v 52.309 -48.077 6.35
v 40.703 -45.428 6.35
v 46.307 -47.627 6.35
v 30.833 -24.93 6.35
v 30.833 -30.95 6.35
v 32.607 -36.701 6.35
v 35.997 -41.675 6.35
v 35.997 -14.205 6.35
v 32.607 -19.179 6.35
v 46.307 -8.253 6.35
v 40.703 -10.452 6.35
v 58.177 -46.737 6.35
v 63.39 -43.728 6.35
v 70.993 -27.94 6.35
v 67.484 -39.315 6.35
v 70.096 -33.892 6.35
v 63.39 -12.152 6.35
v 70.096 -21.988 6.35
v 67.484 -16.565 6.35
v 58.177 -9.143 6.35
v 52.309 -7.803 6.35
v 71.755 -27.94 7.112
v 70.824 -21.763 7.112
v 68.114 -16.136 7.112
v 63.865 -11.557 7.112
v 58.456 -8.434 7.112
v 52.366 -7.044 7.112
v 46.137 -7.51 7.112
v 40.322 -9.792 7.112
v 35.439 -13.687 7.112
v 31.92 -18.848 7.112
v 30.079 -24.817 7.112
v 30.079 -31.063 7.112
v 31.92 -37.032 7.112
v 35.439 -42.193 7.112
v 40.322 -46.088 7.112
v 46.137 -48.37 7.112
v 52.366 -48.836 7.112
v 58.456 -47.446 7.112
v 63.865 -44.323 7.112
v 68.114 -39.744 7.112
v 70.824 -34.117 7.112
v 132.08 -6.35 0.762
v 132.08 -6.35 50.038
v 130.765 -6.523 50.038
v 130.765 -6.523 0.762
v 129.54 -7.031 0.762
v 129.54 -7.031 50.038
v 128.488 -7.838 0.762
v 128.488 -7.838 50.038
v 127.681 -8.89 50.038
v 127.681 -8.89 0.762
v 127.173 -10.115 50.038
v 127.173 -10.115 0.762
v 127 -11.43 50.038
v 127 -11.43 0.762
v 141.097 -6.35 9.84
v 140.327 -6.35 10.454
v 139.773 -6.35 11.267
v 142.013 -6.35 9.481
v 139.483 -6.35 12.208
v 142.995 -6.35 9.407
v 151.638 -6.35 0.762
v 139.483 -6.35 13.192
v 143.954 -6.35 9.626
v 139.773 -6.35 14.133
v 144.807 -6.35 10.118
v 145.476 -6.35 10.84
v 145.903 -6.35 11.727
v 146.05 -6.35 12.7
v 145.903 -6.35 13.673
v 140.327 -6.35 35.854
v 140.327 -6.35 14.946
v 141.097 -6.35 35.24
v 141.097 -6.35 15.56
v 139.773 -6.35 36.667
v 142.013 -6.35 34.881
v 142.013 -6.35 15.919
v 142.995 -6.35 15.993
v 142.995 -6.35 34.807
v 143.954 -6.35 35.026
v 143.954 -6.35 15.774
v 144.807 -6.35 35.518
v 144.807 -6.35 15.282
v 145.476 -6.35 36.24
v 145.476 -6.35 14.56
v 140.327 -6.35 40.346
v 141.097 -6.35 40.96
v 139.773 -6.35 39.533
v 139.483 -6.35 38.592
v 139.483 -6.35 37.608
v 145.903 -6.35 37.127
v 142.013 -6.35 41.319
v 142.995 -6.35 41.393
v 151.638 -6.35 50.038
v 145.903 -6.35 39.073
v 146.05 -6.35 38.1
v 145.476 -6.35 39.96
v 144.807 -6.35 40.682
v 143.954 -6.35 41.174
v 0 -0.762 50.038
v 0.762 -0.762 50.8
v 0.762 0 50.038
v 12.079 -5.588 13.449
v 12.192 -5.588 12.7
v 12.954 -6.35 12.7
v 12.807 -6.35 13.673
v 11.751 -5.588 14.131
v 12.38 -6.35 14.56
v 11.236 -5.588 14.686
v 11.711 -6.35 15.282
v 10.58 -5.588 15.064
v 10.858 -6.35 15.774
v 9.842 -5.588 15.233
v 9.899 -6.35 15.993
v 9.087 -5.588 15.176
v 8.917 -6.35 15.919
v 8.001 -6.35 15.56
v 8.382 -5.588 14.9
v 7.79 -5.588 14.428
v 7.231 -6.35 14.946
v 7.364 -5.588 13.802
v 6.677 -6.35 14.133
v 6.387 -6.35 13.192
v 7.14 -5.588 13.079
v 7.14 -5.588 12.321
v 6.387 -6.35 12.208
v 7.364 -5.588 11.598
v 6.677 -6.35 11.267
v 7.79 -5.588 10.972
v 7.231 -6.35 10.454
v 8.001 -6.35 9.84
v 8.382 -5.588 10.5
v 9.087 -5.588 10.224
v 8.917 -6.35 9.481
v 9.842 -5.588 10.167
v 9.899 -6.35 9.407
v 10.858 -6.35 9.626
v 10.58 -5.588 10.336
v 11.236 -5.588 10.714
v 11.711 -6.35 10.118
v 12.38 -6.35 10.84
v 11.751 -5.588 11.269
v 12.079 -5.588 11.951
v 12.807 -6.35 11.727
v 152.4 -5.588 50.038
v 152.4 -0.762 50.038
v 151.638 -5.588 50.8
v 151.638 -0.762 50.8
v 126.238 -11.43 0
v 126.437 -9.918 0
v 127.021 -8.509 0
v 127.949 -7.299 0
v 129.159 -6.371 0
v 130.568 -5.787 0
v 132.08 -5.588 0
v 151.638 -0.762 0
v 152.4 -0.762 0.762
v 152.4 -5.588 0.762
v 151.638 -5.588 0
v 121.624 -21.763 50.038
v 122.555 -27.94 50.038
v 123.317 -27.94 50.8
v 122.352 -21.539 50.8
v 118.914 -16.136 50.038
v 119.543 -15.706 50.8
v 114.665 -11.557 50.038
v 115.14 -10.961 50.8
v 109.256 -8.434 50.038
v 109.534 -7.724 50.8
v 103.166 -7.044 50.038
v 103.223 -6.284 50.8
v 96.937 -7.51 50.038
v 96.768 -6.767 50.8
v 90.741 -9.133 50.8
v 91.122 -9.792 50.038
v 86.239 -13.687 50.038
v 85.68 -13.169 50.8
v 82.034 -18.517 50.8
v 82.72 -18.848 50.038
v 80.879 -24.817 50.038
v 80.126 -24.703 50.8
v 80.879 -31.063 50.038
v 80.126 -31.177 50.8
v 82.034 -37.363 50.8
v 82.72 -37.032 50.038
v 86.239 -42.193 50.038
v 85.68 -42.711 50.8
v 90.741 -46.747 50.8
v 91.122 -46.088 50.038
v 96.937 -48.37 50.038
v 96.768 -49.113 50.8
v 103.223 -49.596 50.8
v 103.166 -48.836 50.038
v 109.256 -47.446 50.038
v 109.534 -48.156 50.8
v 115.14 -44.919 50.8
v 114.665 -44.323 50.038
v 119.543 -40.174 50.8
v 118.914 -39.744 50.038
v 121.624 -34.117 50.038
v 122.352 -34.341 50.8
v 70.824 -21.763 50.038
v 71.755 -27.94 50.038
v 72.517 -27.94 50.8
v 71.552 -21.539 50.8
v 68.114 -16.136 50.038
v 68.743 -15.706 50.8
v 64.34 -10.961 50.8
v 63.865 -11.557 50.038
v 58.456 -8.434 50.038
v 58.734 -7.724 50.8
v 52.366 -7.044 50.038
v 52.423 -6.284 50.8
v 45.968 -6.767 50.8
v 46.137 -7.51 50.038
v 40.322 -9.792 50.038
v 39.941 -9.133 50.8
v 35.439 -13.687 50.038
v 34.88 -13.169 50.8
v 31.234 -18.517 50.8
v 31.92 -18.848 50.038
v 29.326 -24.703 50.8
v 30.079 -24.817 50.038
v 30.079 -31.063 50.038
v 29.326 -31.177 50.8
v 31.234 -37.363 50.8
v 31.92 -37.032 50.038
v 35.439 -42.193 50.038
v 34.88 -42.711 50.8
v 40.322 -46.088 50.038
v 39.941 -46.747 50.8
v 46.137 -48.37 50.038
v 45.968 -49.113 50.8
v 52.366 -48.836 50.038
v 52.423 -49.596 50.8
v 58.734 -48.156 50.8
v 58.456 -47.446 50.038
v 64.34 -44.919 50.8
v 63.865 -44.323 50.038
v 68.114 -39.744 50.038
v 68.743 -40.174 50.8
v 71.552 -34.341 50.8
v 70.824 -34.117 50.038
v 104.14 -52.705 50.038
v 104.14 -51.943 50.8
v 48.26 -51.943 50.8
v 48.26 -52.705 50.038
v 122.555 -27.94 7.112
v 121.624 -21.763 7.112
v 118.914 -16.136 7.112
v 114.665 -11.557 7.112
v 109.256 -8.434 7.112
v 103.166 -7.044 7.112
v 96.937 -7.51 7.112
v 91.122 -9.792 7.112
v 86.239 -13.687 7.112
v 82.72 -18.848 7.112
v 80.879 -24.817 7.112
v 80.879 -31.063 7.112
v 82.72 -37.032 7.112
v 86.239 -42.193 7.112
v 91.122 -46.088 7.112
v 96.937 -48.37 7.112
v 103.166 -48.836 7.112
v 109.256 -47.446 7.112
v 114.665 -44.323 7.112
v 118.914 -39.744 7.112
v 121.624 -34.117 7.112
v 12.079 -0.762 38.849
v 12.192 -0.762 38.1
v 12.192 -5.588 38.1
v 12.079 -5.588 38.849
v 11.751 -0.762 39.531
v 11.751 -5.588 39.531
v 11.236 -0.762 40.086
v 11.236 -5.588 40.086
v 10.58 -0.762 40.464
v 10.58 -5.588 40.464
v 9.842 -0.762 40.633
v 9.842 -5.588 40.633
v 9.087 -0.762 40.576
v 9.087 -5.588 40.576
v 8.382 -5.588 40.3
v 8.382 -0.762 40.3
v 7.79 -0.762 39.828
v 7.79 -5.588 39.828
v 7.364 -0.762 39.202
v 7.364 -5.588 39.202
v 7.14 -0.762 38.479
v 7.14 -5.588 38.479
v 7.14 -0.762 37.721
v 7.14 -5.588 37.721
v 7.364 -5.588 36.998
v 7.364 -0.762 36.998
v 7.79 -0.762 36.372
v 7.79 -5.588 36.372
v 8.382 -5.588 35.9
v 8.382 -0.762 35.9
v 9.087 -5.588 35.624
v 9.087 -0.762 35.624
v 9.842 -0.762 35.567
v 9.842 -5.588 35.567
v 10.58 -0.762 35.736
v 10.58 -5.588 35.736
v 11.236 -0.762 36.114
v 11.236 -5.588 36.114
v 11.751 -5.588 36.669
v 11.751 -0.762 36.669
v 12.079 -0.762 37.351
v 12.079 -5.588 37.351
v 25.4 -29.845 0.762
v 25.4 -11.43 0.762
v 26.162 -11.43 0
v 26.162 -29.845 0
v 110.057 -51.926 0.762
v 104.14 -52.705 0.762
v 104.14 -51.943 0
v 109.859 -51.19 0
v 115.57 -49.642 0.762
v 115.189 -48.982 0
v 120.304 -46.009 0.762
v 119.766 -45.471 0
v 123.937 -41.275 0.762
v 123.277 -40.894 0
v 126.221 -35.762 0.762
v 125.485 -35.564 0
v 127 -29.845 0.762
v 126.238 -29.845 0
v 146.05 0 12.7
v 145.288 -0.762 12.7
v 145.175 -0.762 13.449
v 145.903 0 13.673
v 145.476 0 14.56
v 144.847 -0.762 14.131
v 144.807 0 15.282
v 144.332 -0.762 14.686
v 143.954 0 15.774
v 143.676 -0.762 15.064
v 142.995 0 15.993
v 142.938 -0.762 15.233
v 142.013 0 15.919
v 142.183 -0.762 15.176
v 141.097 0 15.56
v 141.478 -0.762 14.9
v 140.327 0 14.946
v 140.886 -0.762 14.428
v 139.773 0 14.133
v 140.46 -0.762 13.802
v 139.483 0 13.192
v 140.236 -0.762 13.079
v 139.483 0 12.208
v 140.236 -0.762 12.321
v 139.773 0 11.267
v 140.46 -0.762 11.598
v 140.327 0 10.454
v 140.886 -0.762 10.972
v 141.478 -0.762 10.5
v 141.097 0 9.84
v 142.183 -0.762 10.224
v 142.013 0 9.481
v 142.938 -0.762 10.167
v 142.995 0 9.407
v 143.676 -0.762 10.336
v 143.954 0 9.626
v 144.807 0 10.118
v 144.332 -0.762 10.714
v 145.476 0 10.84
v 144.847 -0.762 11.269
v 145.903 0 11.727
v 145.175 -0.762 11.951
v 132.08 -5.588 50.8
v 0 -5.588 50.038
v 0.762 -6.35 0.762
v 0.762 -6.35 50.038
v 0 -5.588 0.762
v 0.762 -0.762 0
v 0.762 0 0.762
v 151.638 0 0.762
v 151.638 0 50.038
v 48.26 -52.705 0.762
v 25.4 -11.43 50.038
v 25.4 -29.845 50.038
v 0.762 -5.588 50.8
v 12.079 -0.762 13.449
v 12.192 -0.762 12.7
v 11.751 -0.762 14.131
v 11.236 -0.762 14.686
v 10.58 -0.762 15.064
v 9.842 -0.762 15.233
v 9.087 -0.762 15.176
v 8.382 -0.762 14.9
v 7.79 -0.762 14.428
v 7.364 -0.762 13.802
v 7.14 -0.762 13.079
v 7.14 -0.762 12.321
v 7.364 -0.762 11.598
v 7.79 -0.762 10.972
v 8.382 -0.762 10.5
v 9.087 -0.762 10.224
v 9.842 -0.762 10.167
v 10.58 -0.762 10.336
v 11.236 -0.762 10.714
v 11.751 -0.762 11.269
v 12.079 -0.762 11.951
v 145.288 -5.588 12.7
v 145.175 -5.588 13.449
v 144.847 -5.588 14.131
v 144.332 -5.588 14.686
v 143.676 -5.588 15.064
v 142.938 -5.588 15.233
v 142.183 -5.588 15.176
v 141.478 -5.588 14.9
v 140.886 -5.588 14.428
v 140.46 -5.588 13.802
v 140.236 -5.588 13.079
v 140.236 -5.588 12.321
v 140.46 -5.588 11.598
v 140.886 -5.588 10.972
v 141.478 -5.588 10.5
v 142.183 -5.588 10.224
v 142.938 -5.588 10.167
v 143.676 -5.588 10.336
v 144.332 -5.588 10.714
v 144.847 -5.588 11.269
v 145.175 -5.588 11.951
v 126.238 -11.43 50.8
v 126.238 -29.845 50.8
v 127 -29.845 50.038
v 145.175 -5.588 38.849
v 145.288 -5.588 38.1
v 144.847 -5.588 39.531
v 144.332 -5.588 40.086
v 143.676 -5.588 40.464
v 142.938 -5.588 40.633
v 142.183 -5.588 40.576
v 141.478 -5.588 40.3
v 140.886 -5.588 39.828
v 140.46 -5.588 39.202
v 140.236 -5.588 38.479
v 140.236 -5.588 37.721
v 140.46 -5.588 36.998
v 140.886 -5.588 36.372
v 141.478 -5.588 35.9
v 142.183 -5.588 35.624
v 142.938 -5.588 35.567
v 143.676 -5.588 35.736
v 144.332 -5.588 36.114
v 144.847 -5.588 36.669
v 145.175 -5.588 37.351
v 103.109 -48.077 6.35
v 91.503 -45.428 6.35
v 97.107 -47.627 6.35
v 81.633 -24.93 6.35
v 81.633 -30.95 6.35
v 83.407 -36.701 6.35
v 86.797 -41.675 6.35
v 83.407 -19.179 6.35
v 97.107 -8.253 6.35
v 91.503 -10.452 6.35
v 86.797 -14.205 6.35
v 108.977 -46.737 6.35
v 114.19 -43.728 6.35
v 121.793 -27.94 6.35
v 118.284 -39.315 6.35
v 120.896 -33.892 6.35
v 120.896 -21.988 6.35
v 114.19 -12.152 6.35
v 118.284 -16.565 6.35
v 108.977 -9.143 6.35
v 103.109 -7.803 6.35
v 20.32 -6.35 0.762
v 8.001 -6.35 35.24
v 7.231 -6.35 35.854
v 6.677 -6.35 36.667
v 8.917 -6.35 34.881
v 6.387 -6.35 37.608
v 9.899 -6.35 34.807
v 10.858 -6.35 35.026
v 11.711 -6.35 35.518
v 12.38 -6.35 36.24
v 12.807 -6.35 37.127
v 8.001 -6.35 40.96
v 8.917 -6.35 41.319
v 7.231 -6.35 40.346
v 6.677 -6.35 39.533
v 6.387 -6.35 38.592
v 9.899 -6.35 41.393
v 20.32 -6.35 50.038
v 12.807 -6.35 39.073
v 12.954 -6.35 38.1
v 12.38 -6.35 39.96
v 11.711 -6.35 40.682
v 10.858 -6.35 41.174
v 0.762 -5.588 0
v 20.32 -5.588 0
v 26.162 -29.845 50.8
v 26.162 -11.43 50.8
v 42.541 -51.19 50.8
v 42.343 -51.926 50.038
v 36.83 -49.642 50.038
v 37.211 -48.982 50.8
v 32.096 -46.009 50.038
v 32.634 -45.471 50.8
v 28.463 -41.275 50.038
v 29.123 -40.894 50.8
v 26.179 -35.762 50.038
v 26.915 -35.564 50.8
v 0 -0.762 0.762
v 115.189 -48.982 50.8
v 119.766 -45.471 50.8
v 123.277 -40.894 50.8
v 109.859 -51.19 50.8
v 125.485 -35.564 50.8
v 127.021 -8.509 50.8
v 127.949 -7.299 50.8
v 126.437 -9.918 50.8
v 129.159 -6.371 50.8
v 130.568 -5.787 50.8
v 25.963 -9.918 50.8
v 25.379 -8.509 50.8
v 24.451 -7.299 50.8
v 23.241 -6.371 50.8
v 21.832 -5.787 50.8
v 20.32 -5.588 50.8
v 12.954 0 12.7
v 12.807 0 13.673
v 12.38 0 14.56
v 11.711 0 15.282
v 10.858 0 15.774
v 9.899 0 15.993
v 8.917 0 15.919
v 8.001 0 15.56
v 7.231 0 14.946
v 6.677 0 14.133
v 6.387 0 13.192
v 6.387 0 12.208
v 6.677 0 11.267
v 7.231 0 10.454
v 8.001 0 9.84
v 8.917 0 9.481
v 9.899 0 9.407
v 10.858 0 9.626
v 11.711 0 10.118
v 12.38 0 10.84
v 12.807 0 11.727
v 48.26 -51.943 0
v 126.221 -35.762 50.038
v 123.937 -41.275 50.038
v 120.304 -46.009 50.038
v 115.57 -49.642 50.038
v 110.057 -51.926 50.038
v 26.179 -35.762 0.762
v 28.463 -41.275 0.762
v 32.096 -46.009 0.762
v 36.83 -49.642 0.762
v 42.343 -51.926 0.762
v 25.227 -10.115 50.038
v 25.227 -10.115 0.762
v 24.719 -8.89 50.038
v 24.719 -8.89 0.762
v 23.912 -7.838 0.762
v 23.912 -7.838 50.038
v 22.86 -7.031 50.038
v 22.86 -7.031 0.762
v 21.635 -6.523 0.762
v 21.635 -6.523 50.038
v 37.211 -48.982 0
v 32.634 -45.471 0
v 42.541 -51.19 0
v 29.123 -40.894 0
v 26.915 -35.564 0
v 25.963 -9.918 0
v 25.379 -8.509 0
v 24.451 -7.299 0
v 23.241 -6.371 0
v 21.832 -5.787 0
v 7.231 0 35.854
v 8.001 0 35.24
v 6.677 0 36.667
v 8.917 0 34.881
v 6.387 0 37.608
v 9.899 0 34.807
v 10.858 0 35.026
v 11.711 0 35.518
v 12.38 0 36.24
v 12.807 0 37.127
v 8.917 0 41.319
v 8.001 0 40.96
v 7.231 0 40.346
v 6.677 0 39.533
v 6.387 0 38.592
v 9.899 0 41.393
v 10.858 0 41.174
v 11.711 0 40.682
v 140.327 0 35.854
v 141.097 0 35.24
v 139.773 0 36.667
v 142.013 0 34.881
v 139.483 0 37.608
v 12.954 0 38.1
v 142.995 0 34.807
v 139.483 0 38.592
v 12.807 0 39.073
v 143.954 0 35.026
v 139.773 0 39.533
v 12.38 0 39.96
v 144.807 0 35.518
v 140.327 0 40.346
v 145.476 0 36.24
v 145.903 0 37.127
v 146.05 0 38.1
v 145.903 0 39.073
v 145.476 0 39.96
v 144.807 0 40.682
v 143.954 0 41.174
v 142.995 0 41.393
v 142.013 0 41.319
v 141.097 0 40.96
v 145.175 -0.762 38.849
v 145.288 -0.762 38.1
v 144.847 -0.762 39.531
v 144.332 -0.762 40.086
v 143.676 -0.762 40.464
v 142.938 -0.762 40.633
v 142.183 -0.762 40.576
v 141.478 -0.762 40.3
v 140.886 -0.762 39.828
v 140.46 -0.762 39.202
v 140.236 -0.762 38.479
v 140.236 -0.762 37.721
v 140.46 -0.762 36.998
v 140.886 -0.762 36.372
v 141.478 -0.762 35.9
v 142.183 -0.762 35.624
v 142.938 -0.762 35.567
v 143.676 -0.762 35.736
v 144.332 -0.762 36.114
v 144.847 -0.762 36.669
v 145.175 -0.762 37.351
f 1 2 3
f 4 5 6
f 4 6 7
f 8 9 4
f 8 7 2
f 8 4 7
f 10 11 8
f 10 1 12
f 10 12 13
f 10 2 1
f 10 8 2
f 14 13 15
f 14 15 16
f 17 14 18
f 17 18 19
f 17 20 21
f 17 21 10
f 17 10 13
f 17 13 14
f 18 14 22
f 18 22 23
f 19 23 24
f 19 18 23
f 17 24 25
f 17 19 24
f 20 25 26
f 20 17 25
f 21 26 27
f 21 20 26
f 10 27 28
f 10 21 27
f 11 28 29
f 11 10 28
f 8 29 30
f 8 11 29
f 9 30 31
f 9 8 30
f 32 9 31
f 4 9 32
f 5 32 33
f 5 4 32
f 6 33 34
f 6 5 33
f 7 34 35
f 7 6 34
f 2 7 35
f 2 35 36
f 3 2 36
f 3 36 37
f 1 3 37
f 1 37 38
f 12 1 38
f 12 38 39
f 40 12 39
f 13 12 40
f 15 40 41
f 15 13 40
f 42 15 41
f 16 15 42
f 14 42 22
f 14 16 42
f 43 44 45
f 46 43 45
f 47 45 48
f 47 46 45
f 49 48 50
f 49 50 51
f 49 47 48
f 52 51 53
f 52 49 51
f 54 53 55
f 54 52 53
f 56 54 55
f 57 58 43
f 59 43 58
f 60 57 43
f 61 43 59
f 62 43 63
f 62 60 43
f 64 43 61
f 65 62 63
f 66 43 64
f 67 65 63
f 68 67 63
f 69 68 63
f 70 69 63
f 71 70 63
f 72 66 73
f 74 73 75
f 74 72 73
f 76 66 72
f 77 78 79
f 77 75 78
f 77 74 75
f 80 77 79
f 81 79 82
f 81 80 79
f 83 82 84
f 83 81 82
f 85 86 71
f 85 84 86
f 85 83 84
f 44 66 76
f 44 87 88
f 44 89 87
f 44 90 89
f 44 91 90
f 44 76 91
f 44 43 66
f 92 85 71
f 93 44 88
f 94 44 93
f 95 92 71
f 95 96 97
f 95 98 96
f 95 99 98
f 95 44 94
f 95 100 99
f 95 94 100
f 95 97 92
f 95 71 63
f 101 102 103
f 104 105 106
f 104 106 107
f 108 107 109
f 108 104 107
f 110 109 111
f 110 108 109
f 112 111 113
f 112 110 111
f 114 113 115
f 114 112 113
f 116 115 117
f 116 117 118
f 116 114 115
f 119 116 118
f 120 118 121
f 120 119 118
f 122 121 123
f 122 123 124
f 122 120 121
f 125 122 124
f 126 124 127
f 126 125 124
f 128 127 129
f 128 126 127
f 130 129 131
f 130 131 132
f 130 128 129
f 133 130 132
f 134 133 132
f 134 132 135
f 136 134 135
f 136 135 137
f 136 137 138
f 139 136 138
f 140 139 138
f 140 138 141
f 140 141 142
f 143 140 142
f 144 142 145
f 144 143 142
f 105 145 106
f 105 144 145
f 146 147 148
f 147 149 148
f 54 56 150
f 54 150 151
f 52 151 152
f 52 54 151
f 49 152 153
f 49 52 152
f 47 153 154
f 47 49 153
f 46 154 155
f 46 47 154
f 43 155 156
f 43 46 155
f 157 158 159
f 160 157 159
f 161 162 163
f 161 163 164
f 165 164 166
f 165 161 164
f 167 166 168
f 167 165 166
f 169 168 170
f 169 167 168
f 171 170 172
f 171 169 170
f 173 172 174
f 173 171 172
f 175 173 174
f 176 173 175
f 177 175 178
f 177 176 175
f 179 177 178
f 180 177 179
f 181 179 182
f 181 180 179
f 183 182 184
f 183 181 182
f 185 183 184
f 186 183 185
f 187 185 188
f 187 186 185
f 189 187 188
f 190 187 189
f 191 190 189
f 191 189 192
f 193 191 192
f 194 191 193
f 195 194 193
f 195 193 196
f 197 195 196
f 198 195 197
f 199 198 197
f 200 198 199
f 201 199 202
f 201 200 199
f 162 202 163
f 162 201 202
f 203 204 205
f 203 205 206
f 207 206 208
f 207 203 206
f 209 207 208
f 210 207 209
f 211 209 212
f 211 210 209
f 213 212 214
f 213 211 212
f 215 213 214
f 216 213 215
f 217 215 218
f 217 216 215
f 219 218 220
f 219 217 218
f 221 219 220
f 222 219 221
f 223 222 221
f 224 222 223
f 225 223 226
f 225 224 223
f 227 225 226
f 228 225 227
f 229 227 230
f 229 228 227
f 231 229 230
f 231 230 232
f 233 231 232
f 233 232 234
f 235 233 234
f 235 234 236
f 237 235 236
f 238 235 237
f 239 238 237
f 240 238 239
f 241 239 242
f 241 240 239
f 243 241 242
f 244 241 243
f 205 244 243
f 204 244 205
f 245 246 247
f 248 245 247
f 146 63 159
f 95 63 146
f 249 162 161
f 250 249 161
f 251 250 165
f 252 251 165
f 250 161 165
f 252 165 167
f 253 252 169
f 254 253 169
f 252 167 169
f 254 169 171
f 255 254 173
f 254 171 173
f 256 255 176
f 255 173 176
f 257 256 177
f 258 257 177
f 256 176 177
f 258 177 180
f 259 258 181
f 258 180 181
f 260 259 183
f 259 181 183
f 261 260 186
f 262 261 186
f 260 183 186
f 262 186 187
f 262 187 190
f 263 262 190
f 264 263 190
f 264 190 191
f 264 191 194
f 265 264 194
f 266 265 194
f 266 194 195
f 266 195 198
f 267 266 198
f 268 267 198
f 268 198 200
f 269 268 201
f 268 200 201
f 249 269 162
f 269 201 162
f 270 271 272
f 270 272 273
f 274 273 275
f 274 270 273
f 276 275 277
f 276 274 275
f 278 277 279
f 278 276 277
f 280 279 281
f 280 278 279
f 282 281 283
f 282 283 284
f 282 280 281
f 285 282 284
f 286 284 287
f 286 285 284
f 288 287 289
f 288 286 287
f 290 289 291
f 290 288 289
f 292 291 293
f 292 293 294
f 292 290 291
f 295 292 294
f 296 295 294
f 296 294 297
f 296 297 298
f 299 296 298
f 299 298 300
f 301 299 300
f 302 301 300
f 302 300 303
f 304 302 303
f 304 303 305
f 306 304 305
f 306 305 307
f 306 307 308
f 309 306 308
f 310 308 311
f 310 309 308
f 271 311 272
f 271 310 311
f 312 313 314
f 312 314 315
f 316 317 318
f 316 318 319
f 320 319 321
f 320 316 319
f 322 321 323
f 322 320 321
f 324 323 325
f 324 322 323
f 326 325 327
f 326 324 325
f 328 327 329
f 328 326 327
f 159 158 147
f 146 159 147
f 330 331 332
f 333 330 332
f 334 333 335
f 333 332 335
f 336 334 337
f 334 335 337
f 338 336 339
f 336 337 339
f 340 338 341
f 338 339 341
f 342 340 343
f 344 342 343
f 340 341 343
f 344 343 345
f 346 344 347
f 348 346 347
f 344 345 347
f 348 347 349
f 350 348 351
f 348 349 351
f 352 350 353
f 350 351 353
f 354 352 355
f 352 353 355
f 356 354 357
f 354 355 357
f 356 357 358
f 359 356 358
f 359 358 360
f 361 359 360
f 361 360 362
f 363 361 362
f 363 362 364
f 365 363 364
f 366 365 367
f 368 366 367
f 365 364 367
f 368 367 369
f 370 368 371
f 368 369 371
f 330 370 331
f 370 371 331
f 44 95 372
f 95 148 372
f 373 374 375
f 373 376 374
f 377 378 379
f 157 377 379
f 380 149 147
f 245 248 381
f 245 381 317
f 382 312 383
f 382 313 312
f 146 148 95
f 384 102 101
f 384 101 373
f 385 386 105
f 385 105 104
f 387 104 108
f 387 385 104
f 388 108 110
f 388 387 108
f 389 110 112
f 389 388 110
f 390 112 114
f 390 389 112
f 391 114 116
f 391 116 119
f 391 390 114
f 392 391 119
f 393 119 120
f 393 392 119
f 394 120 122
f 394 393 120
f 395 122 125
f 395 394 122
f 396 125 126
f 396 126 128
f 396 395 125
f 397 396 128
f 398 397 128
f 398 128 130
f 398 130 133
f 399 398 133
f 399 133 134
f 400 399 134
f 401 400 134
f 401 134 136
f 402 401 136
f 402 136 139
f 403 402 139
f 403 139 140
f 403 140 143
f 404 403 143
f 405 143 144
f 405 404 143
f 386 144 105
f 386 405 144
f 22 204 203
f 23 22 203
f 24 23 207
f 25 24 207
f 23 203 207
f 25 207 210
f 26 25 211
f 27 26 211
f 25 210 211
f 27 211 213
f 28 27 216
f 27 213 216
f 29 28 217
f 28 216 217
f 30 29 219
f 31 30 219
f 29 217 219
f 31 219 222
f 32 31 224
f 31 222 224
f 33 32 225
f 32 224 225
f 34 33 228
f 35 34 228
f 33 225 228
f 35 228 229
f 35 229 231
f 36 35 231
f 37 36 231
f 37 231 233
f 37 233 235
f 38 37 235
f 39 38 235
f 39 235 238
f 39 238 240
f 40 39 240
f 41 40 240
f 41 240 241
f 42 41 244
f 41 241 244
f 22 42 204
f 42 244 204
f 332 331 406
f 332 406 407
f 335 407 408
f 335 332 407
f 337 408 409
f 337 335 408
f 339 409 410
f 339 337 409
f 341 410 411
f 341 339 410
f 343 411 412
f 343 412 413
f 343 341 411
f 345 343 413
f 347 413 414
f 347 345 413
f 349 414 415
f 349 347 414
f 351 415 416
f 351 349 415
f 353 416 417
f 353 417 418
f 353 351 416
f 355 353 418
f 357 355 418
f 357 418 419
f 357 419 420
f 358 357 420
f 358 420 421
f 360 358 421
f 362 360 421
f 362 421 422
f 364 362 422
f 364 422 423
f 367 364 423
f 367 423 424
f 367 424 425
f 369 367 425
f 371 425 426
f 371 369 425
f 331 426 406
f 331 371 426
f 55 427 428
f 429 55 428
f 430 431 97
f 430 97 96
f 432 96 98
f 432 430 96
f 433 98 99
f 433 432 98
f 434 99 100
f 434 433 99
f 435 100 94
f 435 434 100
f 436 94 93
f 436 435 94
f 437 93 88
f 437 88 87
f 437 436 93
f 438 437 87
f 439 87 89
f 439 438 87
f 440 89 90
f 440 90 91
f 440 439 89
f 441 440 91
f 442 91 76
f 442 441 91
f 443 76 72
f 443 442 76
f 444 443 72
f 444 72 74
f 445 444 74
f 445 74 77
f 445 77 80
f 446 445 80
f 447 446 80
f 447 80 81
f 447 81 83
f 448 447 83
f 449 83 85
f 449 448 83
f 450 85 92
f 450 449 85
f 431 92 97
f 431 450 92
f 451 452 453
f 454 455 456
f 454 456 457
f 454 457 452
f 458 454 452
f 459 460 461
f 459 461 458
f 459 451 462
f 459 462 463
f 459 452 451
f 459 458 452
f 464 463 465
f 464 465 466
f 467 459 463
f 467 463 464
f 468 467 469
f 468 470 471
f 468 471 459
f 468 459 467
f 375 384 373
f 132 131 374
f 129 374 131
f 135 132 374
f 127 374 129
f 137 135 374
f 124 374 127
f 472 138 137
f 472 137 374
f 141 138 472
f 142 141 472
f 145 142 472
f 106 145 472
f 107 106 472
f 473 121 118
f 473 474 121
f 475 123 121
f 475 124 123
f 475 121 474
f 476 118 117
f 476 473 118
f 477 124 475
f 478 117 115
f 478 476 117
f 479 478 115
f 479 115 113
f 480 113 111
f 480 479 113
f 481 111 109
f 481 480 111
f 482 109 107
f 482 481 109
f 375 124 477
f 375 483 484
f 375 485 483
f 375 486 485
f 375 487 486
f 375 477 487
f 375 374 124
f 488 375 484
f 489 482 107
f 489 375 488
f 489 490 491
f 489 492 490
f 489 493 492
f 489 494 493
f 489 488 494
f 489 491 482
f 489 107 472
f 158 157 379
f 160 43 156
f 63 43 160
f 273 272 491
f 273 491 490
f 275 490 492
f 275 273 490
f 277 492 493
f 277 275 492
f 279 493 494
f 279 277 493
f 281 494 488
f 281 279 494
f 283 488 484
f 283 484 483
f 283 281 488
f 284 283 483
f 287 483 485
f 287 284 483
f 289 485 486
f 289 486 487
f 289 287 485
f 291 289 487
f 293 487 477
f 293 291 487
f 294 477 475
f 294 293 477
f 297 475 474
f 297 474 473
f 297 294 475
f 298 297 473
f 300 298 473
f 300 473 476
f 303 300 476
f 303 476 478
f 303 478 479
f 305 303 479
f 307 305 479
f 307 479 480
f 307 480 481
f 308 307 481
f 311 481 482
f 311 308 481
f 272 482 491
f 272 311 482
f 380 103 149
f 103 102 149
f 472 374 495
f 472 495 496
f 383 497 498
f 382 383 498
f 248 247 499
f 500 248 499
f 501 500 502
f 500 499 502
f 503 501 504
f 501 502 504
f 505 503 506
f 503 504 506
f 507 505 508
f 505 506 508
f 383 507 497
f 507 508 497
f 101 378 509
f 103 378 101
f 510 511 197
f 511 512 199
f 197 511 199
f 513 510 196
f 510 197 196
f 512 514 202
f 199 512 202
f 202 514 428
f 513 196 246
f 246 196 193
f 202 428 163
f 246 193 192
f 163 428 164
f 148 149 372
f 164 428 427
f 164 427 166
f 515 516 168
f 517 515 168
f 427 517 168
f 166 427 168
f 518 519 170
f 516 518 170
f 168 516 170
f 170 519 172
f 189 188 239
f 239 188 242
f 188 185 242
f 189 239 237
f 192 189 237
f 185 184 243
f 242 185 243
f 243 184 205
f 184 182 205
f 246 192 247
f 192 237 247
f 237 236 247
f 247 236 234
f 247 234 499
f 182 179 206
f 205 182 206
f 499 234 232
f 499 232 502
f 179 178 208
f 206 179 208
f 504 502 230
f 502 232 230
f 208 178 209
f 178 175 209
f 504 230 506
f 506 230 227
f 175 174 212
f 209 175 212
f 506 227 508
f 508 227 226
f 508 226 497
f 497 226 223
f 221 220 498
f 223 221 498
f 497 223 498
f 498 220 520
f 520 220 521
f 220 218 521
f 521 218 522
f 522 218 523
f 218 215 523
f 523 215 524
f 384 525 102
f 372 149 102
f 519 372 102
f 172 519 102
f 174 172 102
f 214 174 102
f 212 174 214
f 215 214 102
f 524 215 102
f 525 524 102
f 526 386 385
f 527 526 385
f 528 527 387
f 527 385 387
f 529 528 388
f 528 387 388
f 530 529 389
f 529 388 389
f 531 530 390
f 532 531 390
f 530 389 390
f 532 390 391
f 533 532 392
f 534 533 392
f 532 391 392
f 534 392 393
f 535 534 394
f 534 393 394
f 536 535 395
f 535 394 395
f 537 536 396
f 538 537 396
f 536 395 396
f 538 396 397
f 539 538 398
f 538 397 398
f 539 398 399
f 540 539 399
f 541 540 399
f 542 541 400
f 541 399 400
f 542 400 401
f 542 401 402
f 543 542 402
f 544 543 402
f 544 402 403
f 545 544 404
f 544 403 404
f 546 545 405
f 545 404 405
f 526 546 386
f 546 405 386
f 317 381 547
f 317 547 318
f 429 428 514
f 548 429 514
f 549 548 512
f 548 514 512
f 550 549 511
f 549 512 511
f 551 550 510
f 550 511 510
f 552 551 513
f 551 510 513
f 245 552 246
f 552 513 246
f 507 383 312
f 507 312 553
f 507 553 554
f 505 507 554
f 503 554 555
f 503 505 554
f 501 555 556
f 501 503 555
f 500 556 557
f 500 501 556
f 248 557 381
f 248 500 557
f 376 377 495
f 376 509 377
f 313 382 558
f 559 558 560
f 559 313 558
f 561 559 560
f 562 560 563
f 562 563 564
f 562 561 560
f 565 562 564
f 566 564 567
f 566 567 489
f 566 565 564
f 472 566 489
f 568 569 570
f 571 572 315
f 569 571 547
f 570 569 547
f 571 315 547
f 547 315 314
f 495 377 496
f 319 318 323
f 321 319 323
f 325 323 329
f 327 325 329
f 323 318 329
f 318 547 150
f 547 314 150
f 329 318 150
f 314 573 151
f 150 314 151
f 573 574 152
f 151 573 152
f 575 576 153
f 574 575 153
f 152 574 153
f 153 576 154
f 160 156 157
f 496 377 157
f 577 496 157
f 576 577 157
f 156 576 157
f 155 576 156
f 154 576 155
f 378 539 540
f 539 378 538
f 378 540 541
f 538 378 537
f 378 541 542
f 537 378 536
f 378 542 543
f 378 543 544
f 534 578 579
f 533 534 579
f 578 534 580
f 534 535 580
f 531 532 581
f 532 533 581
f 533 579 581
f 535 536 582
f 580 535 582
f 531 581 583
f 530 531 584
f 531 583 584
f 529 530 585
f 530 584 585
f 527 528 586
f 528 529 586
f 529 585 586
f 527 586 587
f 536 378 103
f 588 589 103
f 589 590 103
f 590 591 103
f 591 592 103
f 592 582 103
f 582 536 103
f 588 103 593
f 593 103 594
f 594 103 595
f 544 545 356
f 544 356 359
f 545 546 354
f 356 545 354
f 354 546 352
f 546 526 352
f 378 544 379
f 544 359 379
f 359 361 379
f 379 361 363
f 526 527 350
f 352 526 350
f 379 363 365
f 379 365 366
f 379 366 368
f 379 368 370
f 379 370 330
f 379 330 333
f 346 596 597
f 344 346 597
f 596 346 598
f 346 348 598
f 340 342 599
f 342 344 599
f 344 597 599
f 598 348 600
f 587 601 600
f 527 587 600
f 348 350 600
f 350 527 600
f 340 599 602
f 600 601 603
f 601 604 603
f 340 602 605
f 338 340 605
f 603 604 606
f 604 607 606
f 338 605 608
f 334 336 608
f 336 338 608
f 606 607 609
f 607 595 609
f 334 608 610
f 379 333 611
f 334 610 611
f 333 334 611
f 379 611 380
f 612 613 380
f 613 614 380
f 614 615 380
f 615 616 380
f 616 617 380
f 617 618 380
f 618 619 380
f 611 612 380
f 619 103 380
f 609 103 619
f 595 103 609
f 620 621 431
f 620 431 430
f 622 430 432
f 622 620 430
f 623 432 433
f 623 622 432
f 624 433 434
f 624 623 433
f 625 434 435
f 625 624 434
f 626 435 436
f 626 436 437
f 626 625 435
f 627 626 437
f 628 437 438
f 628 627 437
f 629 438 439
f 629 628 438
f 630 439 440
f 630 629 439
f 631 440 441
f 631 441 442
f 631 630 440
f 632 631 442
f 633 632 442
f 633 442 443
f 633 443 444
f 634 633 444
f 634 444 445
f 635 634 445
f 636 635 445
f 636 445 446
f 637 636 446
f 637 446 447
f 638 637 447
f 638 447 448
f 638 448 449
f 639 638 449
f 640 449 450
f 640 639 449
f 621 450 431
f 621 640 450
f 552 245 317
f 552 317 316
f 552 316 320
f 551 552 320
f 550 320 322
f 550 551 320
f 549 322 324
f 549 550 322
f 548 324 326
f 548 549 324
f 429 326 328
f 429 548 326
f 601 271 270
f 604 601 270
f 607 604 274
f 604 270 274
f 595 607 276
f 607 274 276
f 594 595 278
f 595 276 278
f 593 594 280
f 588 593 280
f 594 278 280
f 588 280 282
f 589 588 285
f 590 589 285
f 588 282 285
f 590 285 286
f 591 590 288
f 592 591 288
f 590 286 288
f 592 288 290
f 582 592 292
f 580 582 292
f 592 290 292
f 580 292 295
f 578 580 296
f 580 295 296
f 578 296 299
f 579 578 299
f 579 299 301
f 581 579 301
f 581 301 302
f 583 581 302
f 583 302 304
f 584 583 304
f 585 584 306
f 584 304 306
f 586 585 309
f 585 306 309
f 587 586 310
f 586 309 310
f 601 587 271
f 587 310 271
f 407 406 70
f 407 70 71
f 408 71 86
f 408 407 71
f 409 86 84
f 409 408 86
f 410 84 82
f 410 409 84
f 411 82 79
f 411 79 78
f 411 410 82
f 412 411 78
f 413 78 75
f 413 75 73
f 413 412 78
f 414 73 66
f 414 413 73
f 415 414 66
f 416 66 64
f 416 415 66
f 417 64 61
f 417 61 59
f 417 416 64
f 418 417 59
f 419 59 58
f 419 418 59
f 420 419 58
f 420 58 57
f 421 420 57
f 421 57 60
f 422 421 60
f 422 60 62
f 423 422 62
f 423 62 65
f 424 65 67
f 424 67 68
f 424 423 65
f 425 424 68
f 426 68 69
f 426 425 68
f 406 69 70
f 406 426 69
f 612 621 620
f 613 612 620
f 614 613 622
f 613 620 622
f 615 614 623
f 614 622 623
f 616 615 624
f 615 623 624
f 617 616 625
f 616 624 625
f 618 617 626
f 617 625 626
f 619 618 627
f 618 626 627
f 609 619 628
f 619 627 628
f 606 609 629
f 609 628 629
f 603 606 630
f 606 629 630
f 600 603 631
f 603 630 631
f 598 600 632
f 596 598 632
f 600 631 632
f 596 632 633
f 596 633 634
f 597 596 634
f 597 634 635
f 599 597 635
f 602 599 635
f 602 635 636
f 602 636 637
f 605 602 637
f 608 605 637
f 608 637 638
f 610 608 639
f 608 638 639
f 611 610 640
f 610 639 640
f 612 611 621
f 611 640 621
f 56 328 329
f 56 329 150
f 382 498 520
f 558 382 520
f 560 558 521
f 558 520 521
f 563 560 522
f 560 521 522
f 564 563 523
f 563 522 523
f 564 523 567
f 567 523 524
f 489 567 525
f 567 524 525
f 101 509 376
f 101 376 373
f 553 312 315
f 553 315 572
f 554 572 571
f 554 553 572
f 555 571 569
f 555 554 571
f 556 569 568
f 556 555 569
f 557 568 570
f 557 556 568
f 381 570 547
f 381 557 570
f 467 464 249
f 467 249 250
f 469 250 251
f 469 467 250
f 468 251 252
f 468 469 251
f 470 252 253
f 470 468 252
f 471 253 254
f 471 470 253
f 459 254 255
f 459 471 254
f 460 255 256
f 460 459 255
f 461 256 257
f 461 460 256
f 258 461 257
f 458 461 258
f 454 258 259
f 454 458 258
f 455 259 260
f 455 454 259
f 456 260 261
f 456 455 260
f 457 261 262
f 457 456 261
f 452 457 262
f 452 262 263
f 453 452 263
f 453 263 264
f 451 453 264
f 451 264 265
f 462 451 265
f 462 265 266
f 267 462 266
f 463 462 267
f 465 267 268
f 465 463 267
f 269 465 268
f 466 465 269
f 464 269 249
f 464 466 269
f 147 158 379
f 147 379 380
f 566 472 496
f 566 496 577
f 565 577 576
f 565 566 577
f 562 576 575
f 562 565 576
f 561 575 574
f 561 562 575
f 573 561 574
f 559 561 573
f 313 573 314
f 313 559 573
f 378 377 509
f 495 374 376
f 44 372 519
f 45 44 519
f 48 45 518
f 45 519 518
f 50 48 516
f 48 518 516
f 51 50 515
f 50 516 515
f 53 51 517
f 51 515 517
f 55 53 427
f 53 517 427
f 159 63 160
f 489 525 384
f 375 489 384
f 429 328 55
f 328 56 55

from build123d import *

# Parameters (mm, degrees)
F0_W     = 25.4
F0_H     = 50.8
F0_R     = 2.54
F0_W_2   = 50.8
F1_DEPTH = 6.35
F2_DEPTH = 52.705
F3_R     = 5.08
F4_R     = 20.955
F5_DEPTH = 44.45
F6_R     = 22.86
F7_SIZE  = 0.762


with BuildPart() as f1:
    # F0 (on Front) → F1 (new body)
    with BuildSketch(Plane.XZ):
        with Locations((12.7, 25.4)):
            Rectangle(F0_W, F0_H)
        with Locations((9.652, 12.7)):
            Circle(F0_R, mode=Mode.SUBTRACT)
        with Locations((9.652, 38.1)):
            Circle(F0_R, mode=Mode.SUBTRACT)
        with Locations((139.7, 25.4)):
            Rectangle(F0_W, F0_H)
        with Locations((142.748, 12.7)):
            Circle(F0_R, mode=Mode.SUBTRACT)
        with Locations((142.748, 38.1)):
            Circle(F0_R, mode=Mode.SUBTRACT)
        with Locations((50.8, 25.4)):
            Rectangle(F0_W_2, F0_H)
        with Locations((101.6, 25.4)):
            Rectangle(F0_W_2, F0_H)
    extrude(amount=F1_DEPTH)

    # F0 (on Front) → F2 (join)
    with BuildSketch(Plane.XZ):
        with Locations((50.8, 25.4)):
            Rectangle(F0_W_2, F0_H)
        with Locations((101.6, 25.4)):
            Rectangle(F0_W_2, F0_H)
    extrude(amount=F2_DEPTH)

    # F3
    f3_edges = [f1.edges().sort_by_distance(p)[0] for p in [
        (127, -6.35, 25.4),
        (25.4, -6.35, 25.4),
    ]]
    fillet(f3_edges, radius=F3_R)

    # F4 (on face) → F5 (cut)
    with BuildSketch(Plane.XY.offset(50.8)):
        with Locations((50.8, -27.94)):
            Circle(F4_R)
        with Locations((101.6, -27.94)):
            Circle(F4_R)
    extrude(amount=-F5_DEPTH, mode=Mode.SUBTRACT)

    # F6
    f6_edges = [f1.edges().sort_by_distance(p)[0] for p in [
        (127, -52.705, 25.4),
        (25.4, -52.705, 25.4),
    ]]
    fillet(f6_edges, radius=F6_R)

    # F7
    f7_edges = [f1.edges().sort_by_distance(p)[0] for p in [
        (127, -20.6375, 50.8),
        (120.304461, -46.009461, 50.8),
        (128.487898, -7.837898, 50.8),
        (76.2, -52.705, 50.8),
        (142.24, -6.35, 50.8),
        (32.095539, -46.009461, 50.8),
        (152.4, -3.175, 50.8),
        (25.4, -20.6375, 50.8),
        (76.2, 0, 50.8),
        (23.912102, -7.837898, 50.8),
        (0, -3.175, 50.8),
        (10.16, -6.35, 50.8),
        (80.645, -27.94, 50.8),
        (29.845, -27.94, 50.8),
        (20.32, -6.35, 25.4),
        (0, -6.35, 25.4),
        (10.16, -6.35, 0),
        (7.112, -6.35, 12.7),
        (7.112, -6.35, 38.1),
        (132.08, -6.35, 25.4),
        (152.4, -6.35, 25.4),
        (142.24, -6.35, 0),
        (140.208, -6.35, 12.7),
        (140.208, -6.35, 38.1),
        (25.4, -20.6375, 0),
        (32.095539, -46.009461, 0),
        (23.912102, -7.837898, 0),
        (76.2, -52.705, 0),
        (120.304461, -46.009461, 0),
        (0, -3.175, 0),
        (127, -20.6375, 0),
        (76.2, 0, 0),
        (128.487898, -7.837898, 0),
        (152.4, -3.175, 0),
        (0, 0, 25.4),
        (152.4, 0, 25.4),
        (7.112, 0, 12.7),
        (7.112, 0, 38.1),
        (140.208, 0, 38.1),
        (140.208, 0, 12.7),
        (29.845, -27.94, 6.35),
        (80.645, -27.94, 6.35),
    ]]
    chamfer(f7_edges, length=F7_SIZE)


solid = f1.part
